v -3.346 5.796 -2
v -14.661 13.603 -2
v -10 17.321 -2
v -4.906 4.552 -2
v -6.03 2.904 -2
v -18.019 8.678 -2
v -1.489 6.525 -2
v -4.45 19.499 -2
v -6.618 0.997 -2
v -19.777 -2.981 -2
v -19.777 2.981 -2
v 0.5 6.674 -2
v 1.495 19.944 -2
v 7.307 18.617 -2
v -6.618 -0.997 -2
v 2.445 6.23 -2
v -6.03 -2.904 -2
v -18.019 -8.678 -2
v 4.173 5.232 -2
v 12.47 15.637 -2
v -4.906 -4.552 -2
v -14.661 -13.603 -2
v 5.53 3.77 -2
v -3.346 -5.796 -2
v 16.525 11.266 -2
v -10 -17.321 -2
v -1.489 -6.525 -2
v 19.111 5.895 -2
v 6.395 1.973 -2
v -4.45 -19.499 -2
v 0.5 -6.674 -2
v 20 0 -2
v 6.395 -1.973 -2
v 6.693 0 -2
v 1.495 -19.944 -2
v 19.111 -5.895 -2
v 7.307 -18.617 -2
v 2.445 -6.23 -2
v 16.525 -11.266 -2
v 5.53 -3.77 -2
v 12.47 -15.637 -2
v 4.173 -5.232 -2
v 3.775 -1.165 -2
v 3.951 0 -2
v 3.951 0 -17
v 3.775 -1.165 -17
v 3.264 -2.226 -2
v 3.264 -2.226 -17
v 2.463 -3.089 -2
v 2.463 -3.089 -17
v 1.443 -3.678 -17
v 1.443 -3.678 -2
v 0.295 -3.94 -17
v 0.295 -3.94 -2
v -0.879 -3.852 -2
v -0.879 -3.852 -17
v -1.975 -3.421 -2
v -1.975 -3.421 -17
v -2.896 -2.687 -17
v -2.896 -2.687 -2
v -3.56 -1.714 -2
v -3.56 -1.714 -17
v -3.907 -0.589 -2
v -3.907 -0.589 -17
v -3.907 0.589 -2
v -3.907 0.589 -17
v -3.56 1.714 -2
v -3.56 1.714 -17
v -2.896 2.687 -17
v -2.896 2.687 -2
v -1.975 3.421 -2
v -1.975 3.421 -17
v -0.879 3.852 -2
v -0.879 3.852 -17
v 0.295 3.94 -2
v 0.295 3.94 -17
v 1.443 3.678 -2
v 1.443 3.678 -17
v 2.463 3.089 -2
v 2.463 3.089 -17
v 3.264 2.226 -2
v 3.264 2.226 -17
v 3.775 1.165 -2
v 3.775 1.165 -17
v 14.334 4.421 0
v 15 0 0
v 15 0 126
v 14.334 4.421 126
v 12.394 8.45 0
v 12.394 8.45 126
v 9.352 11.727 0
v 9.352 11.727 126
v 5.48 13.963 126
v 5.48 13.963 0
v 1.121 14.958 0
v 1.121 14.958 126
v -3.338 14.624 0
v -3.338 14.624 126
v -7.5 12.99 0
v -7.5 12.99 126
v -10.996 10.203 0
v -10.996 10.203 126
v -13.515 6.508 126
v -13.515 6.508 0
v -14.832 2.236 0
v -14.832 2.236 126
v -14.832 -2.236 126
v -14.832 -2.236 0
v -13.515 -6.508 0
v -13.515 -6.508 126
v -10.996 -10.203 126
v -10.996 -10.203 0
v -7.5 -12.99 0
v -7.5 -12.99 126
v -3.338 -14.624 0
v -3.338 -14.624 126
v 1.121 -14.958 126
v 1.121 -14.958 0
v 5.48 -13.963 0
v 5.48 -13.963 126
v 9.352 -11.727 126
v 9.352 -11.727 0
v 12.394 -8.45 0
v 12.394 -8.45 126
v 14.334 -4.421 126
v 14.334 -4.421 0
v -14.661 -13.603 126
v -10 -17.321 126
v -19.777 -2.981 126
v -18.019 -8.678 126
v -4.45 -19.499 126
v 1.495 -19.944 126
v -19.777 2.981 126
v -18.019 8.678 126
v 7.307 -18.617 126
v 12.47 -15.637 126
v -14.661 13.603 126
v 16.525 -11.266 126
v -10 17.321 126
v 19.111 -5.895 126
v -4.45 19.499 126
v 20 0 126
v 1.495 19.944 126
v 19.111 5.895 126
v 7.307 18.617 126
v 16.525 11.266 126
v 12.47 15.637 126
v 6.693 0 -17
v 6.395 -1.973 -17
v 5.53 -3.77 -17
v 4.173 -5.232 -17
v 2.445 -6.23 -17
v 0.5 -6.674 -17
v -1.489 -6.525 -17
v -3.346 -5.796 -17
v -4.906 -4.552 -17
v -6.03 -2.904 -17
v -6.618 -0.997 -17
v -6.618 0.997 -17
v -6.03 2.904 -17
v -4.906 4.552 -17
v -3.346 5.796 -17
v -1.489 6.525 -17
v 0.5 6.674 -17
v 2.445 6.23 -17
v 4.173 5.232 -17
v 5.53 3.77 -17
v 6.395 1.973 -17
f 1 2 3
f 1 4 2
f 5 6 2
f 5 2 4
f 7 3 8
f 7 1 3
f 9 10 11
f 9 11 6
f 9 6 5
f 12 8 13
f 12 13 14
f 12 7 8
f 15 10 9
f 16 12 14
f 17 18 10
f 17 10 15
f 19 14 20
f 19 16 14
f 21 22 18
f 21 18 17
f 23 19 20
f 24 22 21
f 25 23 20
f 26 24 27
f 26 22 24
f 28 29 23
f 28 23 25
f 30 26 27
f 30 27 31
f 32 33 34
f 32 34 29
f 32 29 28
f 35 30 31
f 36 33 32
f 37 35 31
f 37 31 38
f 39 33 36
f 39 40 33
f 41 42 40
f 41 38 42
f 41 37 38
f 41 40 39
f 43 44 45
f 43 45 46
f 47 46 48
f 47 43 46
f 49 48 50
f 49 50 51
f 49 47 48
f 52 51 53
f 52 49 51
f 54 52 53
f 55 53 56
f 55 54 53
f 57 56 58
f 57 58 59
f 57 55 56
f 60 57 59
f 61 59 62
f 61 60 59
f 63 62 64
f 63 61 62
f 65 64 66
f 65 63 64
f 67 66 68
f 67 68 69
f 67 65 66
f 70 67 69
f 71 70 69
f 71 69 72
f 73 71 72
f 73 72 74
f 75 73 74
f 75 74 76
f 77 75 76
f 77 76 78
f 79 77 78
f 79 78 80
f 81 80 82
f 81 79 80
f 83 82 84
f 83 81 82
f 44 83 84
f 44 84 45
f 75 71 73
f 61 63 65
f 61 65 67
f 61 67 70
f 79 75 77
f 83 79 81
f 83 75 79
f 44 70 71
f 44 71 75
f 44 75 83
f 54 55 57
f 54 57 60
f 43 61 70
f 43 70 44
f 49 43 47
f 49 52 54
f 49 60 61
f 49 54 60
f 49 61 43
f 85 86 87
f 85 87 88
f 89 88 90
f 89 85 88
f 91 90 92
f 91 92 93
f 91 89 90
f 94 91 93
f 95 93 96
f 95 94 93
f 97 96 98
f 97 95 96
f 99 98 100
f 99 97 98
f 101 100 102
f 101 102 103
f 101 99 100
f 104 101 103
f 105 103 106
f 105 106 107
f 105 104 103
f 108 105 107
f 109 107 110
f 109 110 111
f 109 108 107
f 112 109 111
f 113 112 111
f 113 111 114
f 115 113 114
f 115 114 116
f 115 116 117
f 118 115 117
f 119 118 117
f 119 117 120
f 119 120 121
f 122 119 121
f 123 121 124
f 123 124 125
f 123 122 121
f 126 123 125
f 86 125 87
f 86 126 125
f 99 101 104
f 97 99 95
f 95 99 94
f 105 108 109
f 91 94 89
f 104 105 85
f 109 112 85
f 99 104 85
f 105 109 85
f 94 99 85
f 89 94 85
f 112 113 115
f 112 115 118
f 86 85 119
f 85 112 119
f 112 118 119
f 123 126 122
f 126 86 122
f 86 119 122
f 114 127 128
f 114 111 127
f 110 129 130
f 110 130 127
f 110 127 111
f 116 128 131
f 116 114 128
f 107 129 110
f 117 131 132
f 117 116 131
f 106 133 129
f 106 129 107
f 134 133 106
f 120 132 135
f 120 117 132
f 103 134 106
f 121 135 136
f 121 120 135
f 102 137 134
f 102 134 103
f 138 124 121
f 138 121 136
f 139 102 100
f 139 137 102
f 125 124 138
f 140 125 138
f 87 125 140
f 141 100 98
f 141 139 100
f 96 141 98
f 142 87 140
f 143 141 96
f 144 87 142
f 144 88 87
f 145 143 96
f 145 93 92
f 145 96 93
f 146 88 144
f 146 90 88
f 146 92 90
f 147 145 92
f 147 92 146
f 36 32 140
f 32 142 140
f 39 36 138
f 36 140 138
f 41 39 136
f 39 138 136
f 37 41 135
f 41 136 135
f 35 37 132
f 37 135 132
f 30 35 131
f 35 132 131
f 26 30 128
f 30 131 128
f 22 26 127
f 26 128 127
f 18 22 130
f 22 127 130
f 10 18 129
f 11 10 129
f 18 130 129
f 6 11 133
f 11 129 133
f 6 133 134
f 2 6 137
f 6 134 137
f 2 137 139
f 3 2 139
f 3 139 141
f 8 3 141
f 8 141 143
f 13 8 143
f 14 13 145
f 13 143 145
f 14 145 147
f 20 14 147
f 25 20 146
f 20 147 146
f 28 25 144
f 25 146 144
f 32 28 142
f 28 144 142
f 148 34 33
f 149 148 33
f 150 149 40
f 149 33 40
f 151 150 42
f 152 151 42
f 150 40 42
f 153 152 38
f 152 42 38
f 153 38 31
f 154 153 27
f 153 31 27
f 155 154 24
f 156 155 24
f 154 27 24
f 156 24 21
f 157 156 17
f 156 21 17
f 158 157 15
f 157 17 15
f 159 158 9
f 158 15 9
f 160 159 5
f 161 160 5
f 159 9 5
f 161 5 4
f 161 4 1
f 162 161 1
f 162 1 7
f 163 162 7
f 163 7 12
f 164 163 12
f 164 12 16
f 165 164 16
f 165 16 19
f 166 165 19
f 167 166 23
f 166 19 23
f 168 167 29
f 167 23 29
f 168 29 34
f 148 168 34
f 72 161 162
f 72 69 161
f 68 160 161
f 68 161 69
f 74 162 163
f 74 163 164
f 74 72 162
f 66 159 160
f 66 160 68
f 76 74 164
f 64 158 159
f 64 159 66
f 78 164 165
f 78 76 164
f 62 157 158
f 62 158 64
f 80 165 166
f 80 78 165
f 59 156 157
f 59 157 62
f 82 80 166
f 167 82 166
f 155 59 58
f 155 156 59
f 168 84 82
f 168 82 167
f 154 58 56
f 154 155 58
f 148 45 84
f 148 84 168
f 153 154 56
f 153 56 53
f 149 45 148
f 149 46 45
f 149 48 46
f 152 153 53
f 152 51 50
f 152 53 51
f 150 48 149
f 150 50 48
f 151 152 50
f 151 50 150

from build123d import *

# Parameters (mm, degrees)
F0_R     = 20
F0_R_2   = 15
F1_DEPTH = 126
F2_R     = 20
F3_DEPTH = 2
F4_R     = 6.692615
F4_R_2   = 3.950799
F5_DEPTH = 15


with BuildPart() as f1:
    # F0 (on Top) → F1 (new body)
    with BuildSketch(Plane.XY):
        Circle(F0_R)
        Circle(F0_R_2, mode=Mode.SUBTRACT)
    extrude(amount=F1_DEPTH)

    # F2 (on face) → F3 (join)
    with BuildSketch(Plane(origin=(0, 0, 0), x_dir=(1, 0, 0), z_dir=(0, 0, -1))):
        Circle(F2_R)
    extrude(amount=F3_DEPTH)

    # F4 (on face) → F5 (join)
    with BuildSketch(Plane(origin=(0, 0, -2), x_dir=(1, 0, 0), z_dir=(0, 0, -1))):
        Circle(F4_R)
        Circle(F4_R_2, mode=Mode.SUBTRACT)
    extrude(amount=F5_DEPTH)


solid = f1.part
